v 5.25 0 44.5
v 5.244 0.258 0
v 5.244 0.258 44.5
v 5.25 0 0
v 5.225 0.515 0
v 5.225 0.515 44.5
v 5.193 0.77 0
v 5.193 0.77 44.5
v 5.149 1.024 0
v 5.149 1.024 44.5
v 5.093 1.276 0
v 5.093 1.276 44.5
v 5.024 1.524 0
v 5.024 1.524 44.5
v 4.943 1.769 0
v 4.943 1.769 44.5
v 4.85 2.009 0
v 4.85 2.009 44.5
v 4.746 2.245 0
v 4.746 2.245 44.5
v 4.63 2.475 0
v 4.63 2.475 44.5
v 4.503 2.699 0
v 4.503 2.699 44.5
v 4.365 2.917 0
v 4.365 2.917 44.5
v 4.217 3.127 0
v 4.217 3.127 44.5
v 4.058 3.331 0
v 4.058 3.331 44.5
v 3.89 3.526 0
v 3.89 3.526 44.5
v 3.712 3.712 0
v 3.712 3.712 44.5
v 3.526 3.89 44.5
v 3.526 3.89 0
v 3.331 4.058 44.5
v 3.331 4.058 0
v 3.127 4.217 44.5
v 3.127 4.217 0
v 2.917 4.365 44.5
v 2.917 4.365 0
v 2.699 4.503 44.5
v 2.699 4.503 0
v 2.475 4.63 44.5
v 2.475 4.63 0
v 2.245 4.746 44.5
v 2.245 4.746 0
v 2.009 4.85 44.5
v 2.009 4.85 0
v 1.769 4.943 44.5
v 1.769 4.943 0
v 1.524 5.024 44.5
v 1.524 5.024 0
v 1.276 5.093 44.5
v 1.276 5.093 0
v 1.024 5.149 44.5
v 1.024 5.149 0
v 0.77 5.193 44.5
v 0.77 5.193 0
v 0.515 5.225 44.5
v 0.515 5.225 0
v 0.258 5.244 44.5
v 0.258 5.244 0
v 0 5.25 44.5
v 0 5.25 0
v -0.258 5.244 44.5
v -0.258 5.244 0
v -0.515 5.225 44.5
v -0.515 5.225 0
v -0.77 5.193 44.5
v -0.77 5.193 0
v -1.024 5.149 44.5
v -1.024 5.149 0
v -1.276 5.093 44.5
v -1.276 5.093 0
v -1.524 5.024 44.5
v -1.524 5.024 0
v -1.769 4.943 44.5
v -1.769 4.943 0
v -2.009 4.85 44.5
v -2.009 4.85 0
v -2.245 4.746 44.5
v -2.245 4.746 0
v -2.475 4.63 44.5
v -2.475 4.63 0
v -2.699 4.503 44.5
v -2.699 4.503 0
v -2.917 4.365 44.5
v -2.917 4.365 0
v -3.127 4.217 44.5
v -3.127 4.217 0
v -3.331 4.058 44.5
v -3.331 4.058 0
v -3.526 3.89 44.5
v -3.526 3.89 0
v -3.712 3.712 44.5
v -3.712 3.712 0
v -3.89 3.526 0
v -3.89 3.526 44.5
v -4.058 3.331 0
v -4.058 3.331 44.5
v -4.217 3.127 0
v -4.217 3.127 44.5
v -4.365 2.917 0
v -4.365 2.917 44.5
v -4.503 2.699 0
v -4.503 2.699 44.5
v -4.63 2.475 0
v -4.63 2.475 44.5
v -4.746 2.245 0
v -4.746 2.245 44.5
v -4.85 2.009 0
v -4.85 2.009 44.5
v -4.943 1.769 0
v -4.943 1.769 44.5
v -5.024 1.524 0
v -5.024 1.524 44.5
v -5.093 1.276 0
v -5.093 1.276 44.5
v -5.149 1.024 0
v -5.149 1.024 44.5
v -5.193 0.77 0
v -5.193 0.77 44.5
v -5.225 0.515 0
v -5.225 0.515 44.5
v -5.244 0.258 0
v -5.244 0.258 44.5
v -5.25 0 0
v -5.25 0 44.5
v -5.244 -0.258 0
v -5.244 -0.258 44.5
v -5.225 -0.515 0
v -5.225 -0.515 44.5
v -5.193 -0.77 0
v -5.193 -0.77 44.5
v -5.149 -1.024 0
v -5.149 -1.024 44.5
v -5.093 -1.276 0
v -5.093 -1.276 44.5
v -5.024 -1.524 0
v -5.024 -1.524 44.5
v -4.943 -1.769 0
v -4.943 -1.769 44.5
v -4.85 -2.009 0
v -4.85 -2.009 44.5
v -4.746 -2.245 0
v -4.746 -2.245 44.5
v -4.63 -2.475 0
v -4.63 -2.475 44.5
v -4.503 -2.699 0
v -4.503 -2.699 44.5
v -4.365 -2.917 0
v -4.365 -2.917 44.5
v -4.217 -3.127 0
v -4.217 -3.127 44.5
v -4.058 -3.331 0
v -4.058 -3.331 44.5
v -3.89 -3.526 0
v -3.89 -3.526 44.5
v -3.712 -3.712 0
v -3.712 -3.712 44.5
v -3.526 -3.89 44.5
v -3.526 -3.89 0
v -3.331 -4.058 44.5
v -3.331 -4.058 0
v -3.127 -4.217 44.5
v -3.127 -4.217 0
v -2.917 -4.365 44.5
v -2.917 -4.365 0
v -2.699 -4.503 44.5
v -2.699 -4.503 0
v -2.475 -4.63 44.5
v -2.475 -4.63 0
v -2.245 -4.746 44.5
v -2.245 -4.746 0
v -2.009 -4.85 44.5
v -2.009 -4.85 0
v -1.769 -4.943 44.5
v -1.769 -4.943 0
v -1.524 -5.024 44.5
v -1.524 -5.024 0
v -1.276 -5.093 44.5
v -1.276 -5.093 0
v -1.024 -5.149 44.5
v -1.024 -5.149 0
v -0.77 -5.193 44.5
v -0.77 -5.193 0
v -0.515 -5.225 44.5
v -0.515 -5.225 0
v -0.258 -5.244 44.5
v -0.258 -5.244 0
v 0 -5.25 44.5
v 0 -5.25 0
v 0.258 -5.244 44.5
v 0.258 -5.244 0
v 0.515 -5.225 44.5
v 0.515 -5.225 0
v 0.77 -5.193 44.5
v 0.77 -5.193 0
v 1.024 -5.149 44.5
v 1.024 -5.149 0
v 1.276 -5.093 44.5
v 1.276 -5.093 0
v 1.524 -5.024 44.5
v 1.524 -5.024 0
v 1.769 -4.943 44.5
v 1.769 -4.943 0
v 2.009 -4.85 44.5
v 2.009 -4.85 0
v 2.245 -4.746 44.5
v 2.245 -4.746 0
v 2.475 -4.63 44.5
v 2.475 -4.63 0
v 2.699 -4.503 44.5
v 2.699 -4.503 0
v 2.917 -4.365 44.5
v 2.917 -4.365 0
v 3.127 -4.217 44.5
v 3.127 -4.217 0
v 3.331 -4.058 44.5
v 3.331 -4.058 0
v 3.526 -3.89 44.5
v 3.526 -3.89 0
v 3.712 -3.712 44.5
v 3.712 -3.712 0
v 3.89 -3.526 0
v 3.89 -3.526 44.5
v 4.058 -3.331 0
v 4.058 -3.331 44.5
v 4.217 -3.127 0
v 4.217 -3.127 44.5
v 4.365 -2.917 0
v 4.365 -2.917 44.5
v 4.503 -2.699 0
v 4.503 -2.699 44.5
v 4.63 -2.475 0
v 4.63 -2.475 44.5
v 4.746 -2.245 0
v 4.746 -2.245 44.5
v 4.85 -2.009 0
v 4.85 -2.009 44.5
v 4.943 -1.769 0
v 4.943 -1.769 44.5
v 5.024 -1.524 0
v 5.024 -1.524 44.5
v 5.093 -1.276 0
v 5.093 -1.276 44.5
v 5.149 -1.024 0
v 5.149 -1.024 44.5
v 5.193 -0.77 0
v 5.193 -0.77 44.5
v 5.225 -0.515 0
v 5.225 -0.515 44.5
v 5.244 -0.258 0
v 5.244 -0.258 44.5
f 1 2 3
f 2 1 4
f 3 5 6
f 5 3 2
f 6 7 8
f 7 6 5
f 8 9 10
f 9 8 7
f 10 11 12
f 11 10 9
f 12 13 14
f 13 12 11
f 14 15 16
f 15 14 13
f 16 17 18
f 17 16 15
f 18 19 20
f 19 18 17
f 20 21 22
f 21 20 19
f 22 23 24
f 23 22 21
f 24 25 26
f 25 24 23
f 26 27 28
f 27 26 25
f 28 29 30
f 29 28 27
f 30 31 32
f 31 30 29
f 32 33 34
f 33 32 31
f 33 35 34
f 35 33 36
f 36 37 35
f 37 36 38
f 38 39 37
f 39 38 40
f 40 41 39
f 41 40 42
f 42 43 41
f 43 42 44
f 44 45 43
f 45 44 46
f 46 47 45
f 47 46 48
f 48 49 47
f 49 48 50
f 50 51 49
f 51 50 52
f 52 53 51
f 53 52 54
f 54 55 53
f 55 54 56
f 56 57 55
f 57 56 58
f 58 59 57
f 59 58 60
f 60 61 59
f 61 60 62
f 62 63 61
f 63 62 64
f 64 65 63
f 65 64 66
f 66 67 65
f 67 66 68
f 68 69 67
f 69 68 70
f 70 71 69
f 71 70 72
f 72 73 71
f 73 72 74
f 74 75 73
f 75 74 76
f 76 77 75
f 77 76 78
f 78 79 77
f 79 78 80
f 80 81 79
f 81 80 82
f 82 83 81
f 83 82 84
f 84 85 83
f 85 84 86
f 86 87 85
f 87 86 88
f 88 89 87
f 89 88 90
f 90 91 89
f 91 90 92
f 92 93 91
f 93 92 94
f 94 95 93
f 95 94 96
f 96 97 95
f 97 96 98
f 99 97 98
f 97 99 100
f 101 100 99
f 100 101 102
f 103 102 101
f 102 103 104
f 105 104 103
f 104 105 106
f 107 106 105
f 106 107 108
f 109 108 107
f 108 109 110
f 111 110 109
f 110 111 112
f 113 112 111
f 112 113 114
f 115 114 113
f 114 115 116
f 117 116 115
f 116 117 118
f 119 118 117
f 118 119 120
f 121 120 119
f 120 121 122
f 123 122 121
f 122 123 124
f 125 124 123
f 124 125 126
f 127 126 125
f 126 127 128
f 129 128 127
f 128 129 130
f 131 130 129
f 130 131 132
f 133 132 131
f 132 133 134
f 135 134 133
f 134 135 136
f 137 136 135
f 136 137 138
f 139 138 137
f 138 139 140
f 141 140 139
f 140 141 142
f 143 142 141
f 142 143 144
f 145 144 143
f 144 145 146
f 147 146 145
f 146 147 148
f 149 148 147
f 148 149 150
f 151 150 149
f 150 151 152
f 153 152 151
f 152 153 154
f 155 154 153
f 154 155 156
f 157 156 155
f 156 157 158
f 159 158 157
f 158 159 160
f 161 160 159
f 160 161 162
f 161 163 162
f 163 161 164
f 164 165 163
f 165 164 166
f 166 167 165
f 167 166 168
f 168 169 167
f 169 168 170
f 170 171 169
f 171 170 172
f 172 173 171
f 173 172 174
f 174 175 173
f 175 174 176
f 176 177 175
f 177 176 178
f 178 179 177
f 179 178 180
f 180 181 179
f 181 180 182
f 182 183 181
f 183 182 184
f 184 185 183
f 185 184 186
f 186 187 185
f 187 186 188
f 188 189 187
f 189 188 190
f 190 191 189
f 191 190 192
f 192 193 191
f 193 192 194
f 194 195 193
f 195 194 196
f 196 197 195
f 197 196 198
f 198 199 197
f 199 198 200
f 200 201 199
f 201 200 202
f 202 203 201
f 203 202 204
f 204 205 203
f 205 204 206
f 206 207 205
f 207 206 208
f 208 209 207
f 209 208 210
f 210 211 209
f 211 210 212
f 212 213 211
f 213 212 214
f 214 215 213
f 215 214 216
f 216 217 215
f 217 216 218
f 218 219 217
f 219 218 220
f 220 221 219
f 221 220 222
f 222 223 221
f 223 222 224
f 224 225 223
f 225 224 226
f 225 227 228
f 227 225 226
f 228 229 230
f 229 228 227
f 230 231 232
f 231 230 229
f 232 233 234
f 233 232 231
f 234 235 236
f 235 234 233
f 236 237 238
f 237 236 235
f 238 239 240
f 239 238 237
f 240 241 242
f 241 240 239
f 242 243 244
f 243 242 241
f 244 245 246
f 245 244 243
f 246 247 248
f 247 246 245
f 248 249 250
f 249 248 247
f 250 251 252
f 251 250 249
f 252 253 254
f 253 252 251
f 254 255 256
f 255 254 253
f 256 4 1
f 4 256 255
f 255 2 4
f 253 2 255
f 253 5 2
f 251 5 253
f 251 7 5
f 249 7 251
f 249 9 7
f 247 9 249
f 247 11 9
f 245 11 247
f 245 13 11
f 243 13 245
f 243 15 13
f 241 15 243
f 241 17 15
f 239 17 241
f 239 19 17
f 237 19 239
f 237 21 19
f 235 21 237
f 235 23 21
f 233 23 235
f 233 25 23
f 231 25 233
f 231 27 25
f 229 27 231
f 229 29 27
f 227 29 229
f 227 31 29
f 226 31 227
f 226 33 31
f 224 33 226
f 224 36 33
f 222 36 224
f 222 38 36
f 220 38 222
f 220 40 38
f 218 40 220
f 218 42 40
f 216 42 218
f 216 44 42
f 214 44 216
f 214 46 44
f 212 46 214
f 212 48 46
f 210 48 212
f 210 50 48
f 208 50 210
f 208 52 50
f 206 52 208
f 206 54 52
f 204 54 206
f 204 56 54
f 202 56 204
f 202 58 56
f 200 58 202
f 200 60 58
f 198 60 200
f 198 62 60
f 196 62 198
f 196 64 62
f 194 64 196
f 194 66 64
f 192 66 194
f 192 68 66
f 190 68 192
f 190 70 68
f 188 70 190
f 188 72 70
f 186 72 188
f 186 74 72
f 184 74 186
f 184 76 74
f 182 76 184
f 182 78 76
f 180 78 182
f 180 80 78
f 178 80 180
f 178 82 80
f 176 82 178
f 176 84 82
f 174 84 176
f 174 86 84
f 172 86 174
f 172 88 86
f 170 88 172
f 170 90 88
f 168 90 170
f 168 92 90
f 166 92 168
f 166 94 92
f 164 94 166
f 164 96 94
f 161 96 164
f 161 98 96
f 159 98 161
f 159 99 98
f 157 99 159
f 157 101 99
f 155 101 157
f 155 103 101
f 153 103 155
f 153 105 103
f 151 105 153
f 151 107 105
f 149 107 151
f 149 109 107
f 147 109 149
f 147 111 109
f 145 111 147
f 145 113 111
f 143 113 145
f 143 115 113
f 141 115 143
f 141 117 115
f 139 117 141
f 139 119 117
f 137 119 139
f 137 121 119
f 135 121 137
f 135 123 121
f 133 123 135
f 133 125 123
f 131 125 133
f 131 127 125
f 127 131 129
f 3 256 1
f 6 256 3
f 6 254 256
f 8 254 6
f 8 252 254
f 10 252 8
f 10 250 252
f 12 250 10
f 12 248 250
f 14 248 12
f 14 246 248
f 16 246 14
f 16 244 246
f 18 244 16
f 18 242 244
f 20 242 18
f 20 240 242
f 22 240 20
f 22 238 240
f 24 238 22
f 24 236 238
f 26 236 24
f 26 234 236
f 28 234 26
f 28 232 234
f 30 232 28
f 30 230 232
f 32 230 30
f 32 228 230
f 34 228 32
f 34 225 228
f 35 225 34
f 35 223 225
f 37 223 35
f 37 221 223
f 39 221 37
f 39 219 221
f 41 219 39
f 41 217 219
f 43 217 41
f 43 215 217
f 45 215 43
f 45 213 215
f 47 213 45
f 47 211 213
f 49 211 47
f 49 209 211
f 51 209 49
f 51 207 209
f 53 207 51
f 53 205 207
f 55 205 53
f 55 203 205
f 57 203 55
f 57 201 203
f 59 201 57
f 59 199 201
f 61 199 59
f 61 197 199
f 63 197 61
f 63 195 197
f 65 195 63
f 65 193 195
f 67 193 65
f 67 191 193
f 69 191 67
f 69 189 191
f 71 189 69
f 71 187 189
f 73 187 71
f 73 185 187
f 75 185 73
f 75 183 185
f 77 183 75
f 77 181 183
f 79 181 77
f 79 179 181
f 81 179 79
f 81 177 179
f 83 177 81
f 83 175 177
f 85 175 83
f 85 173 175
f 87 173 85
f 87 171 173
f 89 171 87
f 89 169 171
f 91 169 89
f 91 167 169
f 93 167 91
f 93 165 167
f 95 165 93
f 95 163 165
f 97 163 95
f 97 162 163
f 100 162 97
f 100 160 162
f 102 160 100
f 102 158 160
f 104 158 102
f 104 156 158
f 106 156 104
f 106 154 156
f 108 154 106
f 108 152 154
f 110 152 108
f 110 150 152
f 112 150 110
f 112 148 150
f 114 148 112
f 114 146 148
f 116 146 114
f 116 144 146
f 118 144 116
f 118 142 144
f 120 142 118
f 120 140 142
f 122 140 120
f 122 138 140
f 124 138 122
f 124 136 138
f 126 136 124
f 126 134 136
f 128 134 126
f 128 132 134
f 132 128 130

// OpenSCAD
$fn = 128;

height = 44.5;      // mm
diameter = 10.5;    // mm

cylinder(h = height, d = diameter);
